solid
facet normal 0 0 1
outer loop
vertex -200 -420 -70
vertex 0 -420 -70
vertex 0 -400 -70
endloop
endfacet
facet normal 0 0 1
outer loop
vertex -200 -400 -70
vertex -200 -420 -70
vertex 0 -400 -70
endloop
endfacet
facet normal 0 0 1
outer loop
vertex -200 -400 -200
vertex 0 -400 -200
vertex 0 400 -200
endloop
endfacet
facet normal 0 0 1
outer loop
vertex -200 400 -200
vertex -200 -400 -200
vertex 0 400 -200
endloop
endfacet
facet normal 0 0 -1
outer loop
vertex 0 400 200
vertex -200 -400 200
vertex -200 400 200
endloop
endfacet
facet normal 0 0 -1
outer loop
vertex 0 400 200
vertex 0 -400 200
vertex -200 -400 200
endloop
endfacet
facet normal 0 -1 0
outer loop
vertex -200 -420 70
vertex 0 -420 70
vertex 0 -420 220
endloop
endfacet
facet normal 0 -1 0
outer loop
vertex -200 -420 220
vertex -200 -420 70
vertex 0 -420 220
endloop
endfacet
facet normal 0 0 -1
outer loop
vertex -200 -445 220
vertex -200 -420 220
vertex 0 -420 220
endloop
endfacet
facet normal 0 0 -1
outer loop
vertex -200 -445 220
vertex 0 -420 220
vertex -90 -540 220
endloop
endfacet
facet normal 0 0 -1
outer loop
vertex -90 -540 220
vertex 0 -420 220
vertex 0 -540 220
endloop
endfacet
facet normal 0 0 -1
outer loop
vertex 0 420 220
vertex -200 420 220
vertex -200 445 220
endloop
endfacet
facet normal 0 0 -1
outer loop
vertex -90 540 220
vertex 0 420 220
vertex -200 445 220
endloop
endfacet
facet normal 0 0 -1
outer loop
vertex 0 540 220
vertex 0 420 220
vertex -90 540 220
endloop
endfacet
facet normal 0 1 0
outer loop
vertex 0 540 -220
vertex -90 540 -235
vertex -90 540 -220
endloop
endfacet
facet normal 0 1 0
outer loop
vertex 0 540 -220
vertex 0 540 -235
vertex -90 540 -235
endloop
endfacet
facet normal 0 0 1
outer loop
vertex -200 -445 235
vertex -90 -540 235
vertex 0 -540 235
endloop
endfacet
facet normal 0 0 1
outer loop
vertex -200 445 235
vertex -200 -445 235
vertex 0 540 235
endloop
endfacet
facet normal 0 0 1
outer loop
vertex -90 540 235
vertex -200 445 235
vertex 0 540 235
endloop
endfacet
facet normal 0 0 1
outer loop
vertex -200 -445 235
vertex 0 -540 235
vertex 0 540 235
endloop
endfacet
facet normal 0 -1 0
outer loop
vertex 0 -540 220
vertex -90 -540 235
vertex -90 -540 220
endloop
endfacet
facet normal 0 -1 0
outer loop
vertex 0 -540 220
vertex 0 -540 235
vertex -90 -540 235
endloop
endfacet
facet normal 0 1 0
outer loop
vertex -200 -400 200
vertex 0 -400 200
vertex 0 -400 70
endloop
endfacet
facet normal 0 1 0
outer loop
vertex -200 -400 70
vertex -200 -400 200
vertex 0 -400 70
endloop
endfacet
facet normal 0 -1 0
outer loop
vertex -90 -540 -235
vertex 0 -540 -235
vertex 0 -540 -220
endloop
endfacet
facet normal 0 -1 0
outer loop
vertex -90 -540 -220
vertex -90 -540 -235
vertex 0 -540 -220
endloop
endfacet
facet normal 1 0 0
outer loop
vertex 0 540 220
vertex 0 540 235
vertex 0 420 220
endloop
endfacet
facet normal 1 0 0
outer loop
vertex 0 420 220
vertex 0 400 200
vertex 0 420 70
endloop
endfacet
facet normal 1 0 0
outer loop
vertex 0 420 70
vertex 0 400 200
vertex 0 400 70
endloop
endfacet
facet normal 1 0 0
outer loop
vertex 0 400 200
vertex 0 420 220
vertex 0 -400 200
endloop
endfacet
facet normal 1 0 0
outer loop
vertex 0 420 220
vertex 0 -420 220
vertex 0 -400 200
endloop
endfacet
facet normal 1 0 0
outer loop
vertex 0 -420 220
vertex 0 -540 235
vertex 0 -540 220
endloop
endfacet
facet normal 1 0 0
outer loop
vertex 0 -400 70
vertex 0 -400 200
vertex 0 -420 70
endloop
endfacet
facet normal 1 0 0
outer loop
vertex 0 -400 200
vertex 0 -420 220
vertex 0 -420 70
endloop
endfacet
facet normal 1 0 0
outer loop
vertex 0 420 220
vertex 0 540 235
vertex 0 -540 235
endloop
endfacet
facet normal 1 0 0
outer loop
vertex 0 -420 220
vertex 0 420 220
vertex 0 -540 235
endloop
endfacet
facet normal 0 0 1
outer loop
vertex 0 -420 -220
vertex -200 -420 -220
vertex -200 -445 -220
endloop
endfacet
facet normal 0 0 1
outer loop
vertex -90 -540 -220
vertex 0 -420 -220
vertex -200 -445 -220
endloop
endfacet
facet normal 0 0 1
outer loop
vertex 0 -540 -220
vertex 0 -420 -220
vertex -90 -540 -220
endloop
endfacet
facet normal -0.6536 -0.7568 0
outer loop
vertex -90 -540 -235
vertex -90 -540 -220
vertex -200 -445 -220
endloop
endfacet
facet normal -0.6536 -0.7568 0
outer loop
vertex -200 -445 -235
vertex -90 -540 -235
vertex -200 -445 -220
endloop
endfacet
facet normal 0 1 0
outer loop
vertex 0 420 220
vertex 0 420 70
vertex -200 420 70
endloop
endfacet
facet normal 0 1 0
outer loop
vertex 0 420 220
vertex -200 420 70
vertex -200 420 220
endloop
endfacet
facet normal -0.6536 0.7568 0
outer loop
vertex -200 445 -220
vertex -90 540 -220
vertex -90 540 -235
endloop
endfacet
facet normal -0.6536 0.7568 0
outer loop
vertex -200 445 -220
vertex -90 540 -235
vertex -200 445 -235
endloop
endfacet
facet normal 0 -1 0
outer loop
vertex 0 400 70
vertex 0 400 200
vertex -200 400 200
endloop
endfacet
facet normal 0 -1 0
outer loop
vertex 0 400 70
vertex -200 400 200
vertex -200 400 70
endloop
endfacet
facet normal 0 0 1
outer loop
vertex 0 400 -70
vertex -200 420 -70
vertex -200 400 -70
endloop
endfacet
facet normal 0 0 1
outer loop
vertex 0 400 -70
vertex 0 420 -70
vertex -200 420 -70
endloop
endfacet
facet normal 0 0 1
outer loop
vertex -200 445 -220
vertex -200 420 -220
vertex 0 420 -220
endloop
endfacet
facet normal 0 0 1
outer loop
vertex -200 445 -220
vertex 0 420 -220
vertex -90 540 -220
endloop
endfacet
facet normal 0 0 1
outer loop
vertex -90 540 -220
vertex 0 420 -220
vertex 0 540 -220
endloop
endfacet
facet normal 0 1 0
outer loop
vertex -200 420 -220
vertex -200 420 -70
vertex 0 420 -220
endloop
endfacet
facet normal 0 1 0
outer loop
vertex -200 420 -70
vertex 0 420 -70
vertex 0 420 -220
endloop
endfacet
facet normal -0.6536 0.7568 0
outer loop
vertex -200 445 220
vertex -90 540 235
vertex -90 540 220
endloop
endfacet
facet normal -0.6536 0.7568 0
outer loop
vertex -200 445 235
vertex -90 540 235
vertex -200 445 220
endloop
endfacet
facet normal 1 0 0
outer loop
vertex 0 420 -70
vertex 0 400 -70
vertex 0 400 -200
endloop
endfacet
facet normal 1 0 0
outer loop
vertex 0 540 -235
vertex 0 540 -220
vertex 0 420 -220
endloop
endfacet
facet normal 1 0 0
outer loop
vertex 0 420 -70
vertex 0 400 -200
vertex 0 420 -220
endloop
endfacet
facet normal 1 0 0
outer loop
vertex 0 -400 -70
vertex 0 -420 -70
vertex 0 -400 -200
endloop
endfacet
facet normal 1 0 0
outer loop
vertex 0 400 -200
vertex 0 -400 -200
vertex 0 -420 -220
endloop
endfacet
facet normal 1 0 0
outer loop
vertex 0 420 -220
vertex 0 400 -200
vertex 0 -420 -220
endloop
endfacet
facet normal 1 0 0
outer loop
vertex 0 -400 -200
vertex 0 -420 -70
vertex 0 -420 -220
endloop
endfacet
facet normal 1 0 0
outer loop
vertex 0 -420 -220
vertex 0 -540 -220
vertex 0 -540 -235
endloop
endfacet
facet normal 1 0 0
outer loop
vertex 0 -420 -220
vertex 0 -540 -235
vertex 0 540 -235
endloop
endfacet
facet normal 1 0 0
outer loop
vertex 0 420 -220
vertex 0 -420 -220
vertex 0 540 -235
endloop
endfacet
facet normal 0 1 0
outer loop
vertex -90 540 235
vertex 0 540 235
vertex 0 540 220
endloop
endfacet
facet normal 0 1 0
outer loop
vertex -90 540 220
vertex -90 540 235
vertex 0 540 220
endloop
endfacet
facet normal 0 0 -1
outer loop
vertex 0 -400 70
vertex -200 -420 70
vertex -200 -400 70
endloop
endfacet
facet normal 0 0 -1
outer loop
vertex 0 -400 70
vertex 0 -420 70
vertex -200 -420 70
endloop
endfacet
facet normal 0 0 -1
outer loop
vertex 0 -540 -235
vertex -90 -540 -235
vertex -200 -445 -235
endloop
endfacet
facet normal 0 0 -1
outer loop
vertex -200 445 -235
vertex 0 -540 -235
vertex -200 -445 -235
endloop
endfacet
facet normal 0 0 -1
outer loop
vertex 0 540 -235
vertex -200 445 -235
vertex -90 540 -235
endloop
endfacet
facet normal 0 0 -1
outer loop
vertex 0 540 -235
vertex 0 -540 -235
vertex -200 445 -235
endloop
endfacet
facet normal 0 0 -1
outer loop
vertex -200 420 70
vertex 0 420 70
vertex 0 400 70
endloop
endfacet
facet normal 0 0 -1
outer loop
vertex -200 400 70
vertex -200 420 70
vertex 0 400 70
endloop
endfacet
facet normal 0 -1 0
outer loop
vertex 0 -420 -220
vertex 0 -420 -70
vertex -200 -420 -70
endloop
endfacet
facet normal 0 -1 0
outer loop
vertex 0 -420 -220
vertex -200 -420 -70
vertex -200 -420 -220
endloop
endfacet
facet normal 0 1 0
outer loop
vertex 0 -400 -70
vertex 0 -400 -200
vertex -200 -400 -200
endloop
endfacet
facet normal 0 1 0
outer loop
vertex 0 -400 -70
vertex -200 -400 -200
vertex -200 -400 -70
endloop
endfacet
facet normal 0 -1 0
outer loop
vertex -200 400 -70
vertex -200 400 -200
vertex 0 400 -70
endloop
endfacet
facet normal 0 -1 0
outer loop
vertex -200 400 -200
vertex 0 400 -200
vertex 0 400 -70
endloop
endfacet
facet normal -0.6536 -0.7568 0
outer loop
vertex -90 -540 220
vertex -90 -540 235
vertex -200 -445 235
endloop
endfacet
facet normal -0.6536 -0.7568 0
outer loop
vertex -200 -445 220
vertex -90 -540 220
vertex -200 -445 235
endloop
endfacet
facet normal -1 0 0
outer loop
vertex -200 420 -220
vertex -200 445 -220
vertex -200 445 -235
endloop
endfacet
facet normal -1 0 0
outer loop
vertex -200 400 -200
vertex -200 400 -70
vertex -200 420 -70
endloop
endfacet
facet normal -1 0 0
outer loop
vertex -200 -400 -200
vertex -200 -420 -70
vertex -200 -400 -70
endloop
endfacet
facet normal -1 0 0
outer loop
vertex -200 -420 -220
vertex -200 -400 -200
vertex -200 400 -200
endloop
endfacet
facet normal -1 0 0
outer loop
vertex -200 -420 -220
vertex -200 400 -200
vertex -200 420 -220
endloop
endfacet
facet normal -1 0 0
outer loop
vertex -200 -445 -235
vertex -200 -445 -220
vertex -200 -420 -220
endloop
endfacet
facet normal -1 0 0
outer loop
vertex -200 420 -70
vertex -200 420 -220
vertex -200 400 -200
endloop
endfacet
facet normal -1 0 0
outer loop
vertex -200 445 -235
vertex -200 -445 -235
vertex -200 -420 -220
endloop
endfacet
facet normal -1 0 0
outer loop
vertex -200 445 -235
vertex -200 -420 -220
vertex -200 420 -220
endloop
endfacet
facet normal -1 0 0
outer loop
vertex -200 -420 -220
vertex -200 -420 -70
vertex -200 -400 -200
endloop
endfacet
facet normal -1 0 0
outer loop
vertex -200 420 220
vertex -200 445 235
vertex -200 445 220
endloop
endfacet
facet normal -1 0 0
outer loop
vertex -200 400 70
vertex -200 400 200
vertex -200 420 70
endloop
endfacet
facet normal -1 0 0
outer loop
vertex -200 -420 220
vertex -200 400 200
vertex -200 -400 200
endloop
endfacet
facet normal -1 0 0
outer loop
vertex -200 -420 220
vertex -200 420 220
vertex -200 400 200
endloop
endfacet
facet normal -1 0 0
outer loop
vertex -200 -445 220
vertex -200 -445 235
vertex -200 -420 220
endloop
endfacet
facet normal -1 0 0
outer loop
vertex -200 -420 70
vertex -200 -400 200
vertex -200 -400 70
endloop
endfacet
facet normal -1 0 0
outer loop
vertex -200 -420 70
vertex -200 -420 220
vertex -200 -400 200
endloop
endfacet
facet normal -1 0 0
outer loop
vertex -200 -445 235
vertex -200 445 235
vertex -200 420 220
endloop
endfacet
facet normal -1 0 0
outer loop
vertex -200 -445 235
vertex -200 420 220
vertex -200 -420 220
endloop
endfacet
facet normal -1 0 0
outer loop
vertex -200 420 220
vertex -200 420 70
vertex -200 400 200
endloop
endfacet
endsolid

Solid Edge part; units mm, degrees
sketch "Sketch1" plane through (0, 0, 0) normal (1, 0, 0) x (0, 1, 0)
  line L0 (-420, 70) -> (-420, 220)
  line L1 (-420, 220) -> (-540, 220)
  line L2 (-540, 235) -> (-540, 220)
  line L3 (-540, 235) -> (540, 235)
  line L4 (540, 235) -> (540, 220)
  line L5 (420, 220) -> (540, 220)
  line L6 (420, 70) -> (420, 220)
  line L7 (420, 70) -> (400, 70)
  line L8 (400, 200) -> (400, 70)
  line L9 (-400, 200) -> (400, 200)
  line L10 (-400, 200) -> (-400, 70)
  line L11 (-420, 70) -> (-400, 70)
  line L12 (-400, -200) -> (400, -200)
  line L13 (400, -200) -> (400, -70)
  line L14 (420, -70) -> (400, -70)
  line L15 (420, -70) -> (420, -220)
  line L16 (420, -220) -> (540, -220)
  line L17 (540, -235) -> (540, -220)
  line L18 (-540, -235) -> (540, -235)
  line L19 (-540, -235) -> (-540, -220)
  line L20 (-420, -220) -> (-540, -220)
  line L21 (-420, -70) -> (-420, -220)
  line L22 (-420, -70) -> (-400, -70)
  line L23 (-400, -200) -> (-400, -70)
  dimension "D1" = 800
  dimension "D2" = 1080
  dimension "D3" = 150
  dimension "D4" = 15
  dimension "D5" = 130
  dimension "D6" = 20
  dimension "D7" = 200
extrude "Protrusion1" add sketch "Sketch1" against normal blind 200
sketch "Sketch2" plane through (-100, 0, 235) normal (0, 0, 1) x (0, 1, 0)
  line L0 (540, -10) -> (445, 100)
  line L1 (445, 100) -> (-445, 100)
  line L2 (-540, -10) -> (-445, 100)
  line L3 (-540, -100) -> (-540, -10)
  line L4 (540, -100) -> (-540, -100)
  line L5 (540, -10) -> (540, -100)
extrude "Ecken" cut sketch "Sketch2" against normal blind 1025.3075 flip side to cut
